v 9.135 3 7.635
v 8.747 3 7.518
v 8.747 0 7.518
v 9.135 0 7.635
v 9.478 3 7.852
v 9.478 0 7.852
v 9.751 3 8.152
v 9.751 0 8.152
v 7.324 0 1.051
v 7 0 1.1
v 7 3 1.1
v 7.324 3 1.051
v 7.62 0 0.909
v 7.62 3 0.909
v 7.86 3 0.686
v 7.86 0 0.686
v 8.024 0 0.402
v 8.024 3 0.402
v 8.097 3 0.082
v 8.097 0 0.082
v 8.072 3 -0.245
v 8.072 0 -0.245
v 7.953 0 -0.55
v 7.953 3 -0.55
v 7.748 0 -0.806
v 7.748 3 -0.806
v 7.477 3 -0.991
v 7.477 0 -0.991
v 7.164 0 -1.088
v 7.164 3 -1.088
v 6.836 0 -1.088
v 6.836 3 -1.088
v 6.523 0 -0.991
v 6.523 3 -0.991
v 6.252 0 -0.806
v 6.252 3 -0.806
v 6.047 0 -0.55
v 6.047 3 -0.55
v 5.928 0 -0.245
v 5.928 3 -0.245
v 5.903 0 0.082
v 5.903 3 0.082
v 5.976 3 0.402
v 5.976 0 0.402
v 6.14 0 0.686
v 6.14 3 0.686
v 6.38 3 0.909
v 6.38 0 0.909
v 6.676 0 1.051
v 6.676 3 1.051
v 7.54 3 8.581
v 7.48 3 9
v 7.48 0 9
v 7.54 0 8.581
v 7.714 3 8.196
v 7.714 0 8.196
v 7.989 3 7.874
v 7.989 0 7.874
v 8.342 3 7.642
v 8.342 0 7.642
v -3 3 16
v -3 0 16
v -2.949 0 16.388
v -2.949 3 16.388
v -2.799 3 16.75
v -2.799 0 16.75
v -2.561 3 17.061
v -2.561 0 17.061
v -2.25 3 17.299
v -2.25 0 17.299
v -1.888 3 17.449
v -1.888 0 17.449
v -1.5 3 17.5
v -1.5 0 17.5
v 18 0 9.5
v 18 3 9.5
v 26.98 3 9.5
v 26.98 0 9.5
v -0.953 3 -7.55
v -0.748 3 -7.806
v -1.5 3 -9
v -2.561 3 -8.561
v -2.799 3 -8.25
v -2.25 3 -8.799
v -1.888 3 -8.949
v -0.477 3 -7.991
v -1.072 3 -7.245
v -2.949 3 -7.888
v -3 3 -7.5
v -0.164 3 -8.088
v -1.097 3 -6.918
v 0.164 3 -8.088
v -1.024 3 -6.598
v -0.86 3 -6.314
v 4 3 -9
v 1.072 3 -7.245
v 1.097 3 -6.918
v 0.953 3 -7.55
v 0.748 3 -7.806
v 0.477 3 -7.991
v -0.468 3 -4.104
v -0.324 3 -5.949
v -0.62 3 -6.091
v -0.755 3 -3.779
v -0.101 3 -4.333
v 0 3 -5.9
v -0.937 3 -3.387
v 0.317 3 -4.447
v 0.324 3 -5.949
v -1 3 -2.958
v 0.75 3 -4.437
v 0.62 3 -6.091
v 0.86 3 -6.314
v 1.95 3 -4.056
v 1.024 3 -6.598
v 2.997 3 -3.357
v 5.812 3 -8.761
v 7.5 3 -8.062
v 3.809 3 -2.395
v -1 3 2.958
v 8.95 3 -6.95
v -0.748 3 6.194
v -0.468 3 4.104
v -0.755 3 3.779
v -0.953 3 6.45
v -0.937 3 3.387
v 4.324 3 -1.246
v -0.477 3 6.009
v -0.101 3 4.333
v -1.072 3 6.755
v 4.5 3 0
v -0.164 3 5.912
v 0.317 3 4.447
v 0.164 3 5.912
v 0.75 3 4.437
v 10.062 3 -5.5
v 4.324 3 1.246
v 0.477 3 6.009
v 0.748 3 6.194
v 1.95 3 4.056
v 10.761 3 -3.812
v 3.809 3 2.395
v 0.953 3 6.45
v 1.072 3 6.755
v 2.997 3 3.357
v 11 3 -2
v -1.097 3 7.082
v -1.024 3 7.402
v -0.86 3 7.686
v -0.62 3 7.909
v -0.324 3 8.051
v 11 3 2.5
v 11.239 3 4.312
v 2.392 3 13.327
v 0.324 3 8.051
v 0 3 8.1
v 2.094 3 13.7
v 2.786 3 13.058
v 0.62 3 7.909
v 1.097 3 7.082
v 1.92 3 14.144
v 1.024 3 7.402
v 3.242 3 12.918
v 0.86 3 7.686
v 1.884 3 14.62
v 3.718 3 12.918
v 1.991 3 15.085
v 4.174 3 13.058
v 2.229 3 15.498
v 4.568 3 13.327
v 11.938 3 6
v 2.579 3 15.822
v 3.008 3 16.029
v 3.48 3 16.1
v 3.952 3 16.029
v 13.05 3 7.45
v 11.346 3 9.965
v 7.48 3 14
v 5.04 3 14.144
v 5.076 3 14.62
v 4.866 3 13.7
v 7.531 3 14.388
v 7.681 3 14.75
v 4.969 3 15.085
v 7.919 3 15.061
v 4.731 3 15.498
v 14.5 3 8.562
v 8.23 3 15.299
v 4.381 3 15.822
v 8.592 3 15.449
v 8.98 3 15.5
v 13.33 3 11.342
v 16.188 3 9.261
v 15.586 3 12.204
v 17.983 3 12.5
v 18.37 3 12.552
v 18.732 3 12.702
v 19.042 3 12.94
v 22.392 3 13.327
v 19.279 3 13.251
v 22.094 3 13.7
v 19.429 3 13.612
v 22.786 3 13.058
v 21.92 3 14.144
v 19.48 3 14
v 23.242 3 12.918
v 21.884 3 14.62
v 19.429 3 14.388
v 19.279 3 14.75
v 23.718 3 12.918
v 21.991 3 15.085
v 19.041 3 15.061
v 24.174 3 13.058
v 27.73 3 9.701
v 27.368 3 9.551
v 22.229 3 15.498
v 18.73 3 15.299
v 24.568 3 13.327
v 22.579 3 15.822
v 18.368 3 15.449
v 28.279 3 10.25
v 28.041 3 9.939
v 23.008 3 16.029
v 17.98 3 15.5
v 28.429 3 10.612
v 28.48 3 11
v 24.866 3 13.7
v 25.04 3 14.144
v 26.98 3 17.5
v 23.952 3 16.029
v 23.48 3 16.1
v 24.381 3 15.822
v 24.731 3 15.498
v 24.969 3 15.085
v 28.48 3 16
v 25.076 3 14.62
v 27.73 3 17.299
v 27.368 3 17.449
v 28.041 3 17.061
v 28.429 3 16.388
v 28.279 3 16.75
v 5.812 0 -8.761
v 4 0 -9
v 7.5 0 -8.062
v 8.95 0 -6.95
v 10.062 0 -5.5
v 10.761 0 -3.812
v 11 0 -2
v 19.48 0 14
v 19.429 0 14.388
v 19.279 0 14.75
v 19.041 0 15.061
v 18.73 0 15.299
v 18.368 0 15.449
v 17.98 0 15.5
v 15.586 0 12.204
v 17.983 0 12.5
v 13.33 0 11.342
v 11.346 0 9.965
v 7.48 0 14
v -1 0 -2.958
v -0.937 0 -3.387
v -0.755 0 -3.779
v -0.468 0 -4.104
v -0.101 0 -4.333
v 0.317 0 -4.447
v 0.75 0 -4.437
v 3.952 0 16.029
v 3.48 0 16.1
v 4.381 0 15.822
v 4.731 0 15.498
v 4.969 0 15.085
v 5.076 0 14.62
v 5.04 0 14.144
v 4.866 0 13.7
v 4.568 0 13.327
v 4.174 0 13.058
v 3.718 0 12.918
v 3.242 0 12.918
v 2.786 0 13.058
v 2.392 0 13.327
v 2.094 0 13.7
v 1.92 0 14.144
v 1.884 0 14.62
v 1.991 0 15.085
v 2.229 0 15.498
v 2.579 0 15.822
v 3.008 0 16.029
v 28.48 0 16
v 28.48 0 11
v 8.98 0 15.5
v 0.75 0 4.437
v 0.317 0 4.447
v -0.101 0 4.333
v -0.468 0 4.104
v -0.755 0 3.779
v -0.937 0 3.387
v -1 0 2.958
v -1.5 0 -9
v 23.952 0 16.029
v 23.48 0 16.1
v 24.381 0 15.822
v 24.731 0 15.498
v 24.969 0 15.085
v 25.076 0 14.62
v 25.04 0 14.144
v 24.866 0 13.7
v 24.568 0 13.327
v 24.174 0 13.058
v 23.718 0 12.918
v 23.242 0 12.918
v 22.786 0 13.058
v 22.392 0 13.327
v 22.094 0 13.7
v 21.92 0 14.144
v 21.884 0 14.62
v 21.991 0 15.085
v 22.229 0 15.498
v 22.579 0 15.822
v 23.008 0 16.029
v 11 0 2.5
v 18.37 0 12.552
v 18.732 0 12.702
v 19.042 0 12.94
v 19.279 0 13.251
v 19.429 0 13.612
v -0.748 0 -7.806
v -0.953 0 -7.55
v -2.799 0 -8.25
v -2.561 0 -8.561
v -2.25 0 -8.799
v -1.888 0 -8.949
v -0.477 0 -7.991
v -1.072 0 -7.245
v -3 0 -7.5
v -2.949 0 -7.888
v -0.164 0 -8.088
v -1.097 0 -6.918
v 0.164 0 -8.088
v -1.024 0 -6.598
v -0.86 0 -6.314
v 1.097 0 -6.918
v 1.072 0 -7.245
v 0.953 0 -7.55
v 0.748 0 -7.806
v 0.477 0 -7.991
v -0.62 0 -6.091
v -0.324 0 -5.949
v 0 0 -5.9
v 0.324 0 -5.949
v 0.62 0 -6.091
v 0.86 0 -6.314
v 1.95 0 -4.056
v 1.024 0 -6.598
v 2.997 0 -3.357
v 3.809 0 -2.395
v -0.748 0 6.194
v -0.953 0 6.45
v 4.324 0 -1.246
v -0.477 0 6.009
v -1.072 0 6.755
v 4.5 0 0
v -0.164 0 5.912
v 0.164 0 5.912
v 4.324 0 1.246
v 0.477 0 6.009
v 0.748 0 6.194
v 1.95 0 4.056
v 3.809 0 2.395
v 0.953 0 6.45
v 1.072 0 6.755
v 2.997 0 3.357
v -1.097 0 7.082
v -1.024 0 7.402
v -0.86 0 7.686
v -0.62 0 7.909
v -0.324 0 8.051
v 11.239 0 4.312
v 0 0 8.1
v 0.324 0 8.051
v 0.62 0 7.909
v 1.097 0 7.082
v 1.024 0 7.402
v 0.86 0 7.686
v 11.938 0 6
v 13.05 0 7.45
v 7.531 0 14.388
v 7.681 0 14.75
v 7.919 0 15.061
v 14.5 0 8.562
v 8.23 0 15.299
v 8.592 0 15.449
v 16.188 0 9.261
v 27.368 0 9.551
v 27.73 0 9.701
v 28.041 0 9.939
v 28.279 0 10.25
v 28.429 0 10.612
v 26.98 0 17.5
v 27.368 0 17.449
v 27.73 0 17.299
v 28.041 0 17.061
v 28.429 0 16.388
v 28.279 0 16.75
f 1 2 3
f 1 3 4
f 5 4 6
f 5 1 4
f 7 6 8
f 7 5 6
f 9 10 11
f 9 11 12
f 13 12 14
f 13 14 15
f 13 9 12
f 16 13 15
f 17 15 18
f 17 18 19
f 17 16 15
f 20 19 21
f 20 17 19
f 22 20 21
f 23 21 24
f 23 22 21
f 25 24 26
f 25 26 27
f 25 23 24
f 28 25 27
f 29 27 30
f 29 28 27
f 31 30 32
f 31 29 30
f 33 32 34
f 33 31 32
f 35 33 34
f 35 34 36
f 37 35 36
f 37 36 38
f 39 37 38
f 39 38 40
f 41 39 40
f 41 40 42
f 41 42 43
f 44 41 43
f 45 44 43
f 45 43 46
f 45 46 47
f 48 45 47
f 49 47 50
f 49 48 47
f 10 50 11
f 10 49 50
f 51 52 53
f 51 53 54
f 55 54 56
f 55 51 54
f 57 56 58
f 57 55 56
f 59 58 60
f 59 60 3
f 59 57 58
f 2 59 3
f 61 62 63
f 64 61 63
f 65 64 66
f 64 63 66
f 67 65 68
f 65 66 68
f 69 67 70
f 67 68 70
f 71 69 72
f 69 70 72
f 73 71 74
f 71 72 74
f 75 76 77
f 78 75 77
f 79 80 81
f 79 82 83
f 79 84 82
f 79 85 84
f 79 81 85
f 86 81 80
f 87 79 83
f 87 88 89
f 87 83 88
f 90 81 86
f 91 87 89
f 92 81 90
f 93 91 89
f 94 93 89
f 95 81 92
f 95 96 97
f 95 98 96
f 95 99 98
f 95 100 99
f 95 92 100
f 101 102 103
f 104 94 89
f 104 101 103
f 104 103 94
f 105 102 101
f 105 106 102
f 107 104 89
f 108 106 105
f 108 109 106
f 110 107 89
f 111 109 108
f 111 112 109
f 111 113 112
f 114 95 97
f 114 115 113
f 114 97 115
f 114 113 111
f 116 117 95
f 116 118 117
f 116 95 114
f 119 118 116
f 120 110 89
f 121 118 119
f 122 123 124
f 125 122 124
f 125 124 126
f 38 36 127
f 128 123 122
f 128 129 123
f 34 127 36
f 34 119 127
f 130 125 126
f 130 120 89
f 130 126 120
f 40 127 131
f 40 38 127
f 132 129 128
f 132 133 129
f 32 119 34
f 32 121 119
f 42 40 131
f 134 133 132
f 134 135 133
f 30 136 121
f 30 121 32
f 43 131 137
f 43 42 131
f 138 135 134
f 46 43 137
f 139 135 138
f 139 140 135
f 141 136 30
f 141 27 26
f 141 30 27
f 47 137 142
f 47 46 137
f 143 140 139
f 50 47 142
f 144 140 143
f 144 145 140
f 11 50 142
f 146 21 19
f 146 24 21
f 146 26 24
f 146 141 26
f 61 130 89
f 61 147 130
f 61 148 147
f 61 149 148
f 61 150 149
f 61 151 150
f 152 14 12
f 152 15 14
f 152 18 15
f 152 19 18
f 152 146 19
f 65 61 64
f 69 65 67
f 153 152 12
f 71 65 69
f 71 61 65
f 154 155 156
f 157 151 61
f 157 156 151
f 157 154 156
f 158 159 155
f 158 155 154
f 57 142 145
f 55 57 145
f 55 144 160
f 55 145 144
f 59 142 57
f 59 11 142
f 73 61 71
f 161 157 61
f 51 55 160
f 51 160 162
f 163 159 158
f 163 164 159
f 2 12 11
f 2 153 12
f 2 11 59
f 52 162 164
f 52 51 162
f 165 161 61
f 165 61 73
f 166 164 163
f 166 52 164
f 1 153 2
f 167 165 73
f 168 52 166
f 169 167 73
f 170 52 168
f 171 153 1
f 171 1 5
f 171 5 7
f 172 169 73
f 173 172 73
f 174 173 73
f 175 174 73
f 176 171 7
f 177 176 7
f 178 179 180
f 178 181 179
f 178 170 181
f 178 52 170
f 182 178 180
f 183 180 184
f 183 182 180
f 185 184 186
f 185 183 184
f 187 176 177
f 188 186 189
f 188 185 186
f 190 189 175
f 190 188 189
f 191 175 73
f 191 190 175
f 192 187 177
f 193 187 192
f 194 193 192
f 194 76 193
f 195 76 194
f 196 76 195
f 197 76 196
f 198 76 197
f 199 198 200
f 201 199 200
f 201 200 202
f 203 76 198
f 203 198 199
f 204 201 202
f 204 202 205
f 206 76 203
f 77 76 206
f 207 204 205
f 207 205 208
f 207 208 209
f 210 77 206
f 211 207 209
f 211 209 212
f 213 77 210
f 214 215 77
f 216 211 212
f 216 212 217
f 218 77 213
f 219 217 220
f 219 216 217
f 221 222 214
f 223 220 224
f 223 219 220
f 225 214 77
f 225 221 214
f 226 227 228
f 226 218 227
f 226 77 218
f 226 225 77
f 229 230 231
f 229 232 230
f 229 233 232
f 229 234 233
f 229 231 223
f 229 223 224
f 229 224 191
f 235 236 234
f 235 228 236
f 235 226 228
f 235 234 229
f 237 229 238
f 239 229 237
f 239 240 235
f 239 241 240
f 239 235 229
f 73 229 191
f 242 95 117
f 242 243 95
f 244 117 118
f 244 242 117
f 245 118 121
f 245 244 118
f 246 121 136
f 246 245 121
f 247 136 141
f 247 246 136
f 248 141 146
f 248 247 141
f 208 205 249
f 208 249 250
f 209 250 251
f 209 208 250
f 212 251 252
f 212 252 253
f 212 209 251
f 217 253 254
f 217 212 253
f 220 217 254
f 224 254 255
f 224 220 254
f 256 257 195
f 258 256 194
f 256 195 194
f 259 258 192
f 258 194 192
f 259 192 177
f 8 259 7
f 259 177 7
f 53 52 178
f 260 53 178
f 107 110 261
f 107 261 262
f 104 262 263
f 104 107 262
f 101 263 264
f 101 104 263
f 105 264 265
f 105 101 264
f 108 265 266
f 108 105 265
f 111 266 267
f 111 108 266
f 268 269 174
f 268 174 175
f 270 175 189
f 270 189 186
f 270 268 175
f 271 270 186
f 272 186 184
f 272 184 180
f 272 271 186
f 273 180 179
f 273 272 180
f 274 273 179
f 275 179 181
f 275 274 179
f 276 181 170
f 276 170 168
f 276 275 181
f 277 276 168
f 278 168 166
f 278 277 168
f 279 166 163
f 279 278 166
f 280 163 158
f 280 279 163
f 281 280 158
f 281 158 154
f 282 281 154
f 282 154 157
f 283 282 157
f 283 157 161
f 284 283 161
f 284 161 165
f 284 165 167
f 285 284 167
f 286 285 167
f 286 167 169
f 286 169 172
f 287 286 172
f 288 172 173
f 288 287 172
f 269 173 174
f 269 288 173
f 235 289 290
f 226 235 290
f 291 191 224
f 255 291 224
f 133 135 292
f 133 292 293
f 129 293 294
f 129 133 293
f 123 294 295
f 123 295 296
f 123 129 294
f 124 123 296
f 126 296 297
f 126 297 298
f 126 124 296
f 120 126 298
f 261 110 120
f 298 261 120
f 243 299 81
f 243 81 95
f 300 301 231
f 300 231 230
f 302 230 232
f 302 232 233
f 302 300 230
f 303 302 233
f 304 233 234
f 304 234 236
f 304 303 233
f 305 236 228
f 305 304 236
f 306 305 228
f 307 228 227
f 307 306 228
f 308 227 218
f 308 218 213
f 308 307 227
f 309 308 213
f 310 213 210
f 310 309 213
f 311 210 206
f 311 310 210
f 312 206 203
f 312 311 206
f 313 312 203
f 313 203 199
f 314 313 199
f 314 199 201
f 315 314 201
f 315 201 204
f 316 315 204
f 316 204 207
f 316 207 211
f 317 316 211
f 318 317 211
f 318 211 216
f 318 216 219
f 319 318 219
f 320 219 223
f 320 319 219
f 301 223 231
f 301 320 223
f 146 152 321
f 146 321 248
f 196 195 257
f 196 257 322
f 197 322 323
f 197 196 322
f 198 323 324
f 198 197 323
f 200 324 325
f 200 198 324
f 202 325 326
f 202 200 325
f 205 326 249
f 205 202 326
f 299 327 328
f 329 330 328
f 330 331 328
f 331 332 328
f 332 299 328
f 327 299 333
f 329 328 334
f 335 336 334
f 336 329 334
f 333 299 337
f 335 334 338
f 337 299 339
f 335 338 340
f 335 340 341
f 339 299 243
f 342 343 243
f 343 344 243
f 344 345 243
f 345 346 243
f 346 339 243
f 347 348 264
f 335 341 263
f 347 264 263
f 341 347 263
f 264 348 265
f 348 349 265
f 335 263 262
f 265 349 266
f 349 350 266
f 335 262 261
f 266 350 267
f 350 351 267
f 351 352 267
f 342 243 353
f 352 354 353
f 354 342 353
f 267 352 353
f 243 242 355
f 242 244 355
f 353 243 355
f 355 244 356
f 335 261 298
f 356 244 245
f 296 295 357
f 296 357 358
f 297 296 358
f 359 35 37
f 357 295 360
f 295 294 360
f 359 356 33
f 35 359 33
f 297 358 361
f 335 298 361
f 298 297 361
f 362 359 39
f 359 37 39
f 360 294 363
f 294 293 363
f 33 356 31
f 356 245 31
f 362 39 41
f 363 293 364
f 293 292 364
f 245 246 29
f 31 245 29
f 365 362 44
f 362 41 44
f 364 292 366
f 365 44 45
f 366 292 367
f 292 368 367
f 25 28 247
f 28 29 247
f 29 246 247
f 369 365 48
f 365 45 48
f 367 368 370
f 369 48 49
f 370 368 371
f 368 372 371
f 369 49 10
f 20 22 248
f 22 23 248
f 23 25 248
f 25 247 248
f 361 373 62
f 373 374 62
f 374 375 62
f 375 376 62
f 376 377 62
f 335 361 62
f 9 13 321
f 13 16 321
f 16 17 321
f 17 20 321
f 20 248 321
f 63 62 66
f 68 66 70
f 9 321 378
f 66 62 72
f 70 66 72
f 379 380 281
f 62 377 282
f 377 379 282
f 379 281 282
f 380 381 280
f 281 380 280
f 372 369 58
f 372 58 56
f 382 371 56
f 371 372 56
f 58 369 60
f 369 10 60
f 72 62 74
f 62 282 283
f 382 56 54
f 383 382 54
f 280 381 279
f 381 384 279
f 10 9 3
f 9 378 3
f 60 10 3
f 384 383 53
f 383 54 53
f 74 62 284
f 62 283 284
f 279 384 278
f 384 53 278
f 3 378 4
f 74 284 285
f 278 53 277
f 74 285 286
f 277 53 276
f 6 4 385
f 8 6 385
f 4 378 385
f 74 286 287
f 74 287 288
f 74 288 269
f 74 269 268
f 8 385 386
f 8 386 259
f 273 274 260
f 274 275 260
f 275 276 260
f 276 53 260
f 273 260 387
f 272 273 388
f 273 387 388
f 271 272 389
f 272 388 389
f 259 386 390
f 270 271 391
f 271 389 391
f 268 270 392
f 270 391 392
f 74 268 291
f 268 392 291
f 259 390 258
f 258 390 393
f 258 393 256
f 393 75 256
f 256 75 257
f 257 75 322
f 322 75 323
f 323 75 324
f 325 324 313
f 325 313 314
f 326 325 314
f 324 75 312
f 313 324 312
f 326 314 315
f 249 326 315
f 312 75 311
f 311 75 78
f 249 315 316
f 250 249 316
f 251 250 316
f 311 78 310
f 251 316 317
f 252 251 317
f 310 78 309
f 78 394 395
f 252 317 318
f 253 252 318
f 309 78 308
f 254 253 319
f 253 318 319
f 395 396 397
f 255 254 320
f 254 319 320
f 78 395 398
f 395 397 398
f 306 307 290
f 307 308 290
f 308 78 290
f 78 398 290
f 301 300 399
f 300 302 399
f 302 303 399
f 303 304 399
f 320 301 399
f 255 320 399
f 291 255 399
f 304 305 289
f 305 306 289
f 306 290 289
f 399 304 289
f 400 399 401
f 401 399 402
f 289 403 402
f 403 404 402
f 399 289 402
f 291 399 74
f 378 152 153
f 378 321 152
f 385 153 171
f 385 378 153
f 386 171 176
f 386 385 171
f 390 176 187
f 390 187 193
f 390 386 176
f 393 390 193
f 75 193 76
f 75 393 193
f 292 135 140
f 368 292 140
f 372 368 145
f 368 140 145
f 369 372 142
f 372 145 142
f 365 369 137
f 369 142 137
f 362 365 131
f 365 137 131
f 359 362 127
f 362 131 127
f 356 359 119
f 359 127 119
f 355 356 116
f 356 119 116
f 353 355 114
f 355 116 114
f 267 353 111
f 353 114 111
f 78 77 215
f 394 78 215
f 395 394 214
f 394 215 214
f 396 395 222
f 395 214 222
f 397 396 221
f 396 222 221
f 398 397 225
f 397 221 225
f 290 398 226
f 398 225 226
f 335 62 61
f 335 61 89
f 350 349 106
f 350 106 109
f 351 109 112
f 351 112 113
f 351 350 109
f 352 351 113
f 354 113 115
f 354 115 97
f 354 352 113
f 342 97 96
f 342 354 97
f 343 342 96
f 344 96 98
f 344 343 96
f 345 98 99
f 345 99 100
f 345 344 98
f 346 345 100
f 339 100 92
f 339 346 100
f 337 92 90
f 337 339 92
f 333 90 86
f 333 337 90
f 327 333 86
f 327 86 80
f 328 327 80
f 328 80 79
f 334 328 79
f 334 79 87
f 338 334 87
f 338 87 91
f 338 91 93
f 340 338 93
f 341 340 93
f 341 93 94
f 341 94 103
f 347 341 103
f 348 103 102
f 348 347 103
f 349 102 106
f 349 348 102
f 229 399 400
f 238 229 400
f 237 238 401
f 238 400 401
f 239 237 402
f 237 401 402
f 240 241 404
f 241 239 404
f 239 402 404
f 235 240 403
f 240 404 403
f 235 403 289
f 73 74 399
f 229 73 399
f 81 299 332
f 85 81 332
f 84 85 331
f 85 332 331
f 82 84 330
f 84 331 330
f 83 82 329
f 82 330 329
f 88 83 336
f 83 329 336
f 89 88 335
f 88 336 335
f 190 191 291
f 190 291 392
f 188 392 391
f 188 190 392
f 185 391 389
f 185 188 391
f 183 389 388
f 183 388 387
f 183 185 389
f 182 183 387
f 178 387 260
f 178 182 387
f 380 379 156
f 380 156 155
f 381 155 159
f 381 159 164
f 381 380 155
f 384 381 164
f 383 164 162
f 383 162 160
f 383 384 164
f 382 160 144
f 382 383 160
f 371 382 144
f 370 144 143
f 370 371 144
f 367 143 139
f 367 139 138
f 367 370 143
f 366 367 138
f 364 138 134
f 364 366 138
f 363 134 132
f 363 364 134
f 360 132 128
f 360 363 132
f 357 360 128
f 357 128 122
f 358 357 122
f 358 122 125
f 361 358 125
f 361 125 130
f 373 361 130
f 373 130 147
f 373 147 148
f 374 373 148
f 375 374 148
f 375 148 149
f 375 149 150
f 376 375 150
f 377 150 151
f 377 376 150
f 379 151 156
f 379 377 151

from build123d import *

# Parameters (mm, degrees)
SKETCH_1_W          = 31.48
SKETCH_1_H          = 26.5
SKETCH_1_R          = 1.1
SKETCH_1_R_2        = 1.6
EXTRUDE_1_DEPTH     = 3
SKETCH_2_W          = 17.48
SKETCH_2_H          = 18.5
CUT_EXTRUDE_1_DEPTH = 21.5
FILLET_1_R          = 7
CUT_EXTRUDE_2_DEPTH = 21.5
FILLET_2_R          = 1.5


with BuildPart() as part:
    # 草图1 → 凸台-拉伸1 (new body)
    with BuildSketch(Plane(origin=(0, 0, 0), x_dir=(1, 0, 0), z_dir=(0, 1, 0))):
        with Locations((12.74, -4.25)):
            Rectangle(SKETCH_1_W, SKETCH_1_H)
        with Locations(Location((0, 7, 0), (0, 0, 270))):
            Circle(SKETCH_1_R, mode=Mode.SUBTRACT)
        with Locations(Location((7, 0, 0), (0, 0, 270))):
            Circle(SKETCH_1_R, mode=Mode.SUBTRACT)
        with Locations(Location((0, -7, 0), (0, 0, 270))):
            Circle(SKETCH_1_R, mode=Mode.SUBTRACT)
        with Locations(Location((3.48, -14.5, 0), (0, 0, 270))):
            Circle(SKETCH_1_R_2, mode=Mode.SUBTRACT)
        with Locations(Location((23.48, -14.5, 0), (0, 0, 270))):
            Circle(SKETCH_1_R_2, mode=Mode.SUBTRACT)
    extrude(amount=EXTRUDE_1_DEPTH)

    # 草图2 → 切除-拉伸1 (cut)
    with BuildSketch(Plane(origin=(0, 3, 0), x_dir=(1, 0, 0), z_dir=(0, 1, 0))):
        with Locations((19.74, -0.25)):
            Rectangle(SKETCH_2_W, SKETCH_2_H)
        with BuildLine():
            Line((-1, 4.387482194), (-1, -4.387482194))
            ThreePointArc((-1, -4.387482194), (4.5, 0), (-1, 4.387482194))
        make_face()
    extrude(amount=-CUT_EXTRUDE_1_DEPTH, mode=Mode.SUBTRACT)

    # 圆角1
    fillet_1_edges = [part.edges().sort_by_distance(p)[0] for p in [
        (11, 1.5, -9),
        (11, 1.5, 9.5),
    ]]
    fillet(fillet_1_edges, radius=FILLET_1_R)

    # 草图3 → 切除-拉伸2 (cut)
    with BuildSketch(Plane(origin=(0, 3, 0), x_dir=(1, 0, 0), z_dir=(0, 1, 0))):
        with BuildLine():
            Line((7.48, -7.5), (7.48, -15.5))
            Line((7.48, -15.5), (19.48, -15.5))
            Line((19.48, -15.5), (19.48, -12.389873609))
            ThreePointArc((19.48, -12.389873609), (13.656415306, -11.507400958), (9.339745962, -7.5))
            Line((9.339745962, -7.5), (7.48, -7.5))
        make_face()
    extrude(amount=-CUT_EXTRUDE_2_DEPTH, mode=Mode.SUBTRACT)

    # 圆角2
    # the kernel refuses this fillet: 1.5 mm, written as the material it adds along each edge
    with BuildSketch(Plane(origin=(-1, 3, -4.387482194), x_dir=(0, 0, 1), z_dir=(0, -1, 0))) as fillet_2_piece_1:
        with BuildLine():
            CenterArc((1.429442302, -1.5), FILLET_2_R, 90, 99.594068227)
            ThreePointArc((-0.049577644, -1.75), (-0.110713057, -0.872565759), (0, 0))
            Line((0, 0), (1.429442302, 0))
        make_face()
    extrude(amount=3)
    with BuildSketch(Plane(origin=(-1, 3, 4.387482194), x_dir=(0, 0, -1), z_dir=(0, -1, 0))) as fillet_2_piece_2:
        with BuildLine():
            CenterArc((1.429442302, 1.5), FILLET_2_R, 170.405931773, 99.594068227)
            ThreePointArc((-0.049577644, 1.75), (-0.110713057, 0.872565759), (0, 0))
            Line((0, 0), (1.429442302, 0))
        make_face()
    extrude(amount=3)
    with BuildSketch(Plane(origin=(19.48, 3, 12.389873609), x_dir=(-0.9973071885231932, 0, 0.07333738282733993), z_dir=(0, -1, 0))) as fillet_2_piece_3:
        with BuildLine():
            CenterArc((1.614041963, -1.495767206), FILLET_2_R, 94.30534313, 89.900355116)
            Line((0.11808118, -1.60577328), (0, 0))
            ThreePointArc((0, 0), (0.750717192, -0.02821863), (1.501434384, 0))
        make_face()
    extrude(amount=3)
    with BuildSketch(Plane(origin=(19.48, 3, 15.5), x_dir=(0, 0, -1), z_dir=(0, -1, 0)), Plane(origin=(7.48, 3, 7.5), x_dir=(0, 0, 1), z_dir=(0, -1, 0))) as fillet_2_piece_4:
        with BuildLine():
            CenterArc((FILLET_2_R, -FILLET_2_R), FILLET_2_R, 90, 90)
            Line((0, -FILLET_2_R), (0, 0))
            Line((0, 0), (FILLET_2_R, 0))
        make_face()
    extrude(amount=3)
    with BuildSketch(Plane(origin=(7.48, 3, 15.5), x_dir=(0, 0, -1), z_dir=(0, -1, 0))) as fillet_2_piece_5:
        with BuildLine():
            CenterArc((FILLET_2_R, FILLET_2_R), FILLET_2_R, 180, 90)
            Line((0, FILLET_2_R), (0, 0))
            Line((0, 0), (FILLET_2_R, 0))
        make_face()
    extrude(amount=3)
    with BuildSketch(Plane(origin=(9.339745962, 3, 7.5), x_dir=(-1, 0, 0), z_dir=(0, -1, 0))) as fillet_2_piece_6:
        with BuildLine():
            CenterArc((0.826578943, -1.5), FILLET_2_R, 90, 55.58261129)
            ThreePointArc((-0.410834055, -0.652173913), (-0.199131088, -0.330046756), (0, 0))
            Line((0, 0), (0.826578943, 0))
        make_face()
    extrude(amount=3)
    # the kernel refuses this fillet: 1.5 mm, written as the material it takes off along each edge
    with BuildSketch(Plane(origin=(28.48, 6.75, 9.5), x_dir=(-1, 0, 0), z_dir=(0, -1, 0)), Plane(origin=(-3, -3.75, 17.5), x_dir=(0, 0, -1), z_dir=(0, 1, 0)), Plane(origin=(-3, -3.75, -9), x_dir=(1, 0, 0), z_dir=(0, 1, 0))) as fillet_2_2_piece_1:
        with BuildLine():
            CenterArc((FILLET_2_R, -FILLET_2_R), FILLET_2_R, 90, 90)
            Line((0, -FILLET_2_R), (0, 0))
            Line((0, 0), (FILLET_2_R, 0))
        make_face()
    extrude(amount=10.5, mode=Mode.SUBTRACT)
    with BuildSketch(Plane(origin=(28.48, -3.75, 17.5), x_dir=(0, 0, -1), z_dir=(0, 1, 0))) as fillet_2_2_piece_2:
        with BuildLine():
            CenterArc((FILLET_2_R, FILLET_2_R), FILLET_2_R, 180, 90)
            Line((0, FILLET_2_R), (0, 0))
            Line((0, 0), (FILLET_2_R, 0))
        make_face()
    extrude(amount=10.5, mode=Mode.SUBTRACT)


solid = part.part
